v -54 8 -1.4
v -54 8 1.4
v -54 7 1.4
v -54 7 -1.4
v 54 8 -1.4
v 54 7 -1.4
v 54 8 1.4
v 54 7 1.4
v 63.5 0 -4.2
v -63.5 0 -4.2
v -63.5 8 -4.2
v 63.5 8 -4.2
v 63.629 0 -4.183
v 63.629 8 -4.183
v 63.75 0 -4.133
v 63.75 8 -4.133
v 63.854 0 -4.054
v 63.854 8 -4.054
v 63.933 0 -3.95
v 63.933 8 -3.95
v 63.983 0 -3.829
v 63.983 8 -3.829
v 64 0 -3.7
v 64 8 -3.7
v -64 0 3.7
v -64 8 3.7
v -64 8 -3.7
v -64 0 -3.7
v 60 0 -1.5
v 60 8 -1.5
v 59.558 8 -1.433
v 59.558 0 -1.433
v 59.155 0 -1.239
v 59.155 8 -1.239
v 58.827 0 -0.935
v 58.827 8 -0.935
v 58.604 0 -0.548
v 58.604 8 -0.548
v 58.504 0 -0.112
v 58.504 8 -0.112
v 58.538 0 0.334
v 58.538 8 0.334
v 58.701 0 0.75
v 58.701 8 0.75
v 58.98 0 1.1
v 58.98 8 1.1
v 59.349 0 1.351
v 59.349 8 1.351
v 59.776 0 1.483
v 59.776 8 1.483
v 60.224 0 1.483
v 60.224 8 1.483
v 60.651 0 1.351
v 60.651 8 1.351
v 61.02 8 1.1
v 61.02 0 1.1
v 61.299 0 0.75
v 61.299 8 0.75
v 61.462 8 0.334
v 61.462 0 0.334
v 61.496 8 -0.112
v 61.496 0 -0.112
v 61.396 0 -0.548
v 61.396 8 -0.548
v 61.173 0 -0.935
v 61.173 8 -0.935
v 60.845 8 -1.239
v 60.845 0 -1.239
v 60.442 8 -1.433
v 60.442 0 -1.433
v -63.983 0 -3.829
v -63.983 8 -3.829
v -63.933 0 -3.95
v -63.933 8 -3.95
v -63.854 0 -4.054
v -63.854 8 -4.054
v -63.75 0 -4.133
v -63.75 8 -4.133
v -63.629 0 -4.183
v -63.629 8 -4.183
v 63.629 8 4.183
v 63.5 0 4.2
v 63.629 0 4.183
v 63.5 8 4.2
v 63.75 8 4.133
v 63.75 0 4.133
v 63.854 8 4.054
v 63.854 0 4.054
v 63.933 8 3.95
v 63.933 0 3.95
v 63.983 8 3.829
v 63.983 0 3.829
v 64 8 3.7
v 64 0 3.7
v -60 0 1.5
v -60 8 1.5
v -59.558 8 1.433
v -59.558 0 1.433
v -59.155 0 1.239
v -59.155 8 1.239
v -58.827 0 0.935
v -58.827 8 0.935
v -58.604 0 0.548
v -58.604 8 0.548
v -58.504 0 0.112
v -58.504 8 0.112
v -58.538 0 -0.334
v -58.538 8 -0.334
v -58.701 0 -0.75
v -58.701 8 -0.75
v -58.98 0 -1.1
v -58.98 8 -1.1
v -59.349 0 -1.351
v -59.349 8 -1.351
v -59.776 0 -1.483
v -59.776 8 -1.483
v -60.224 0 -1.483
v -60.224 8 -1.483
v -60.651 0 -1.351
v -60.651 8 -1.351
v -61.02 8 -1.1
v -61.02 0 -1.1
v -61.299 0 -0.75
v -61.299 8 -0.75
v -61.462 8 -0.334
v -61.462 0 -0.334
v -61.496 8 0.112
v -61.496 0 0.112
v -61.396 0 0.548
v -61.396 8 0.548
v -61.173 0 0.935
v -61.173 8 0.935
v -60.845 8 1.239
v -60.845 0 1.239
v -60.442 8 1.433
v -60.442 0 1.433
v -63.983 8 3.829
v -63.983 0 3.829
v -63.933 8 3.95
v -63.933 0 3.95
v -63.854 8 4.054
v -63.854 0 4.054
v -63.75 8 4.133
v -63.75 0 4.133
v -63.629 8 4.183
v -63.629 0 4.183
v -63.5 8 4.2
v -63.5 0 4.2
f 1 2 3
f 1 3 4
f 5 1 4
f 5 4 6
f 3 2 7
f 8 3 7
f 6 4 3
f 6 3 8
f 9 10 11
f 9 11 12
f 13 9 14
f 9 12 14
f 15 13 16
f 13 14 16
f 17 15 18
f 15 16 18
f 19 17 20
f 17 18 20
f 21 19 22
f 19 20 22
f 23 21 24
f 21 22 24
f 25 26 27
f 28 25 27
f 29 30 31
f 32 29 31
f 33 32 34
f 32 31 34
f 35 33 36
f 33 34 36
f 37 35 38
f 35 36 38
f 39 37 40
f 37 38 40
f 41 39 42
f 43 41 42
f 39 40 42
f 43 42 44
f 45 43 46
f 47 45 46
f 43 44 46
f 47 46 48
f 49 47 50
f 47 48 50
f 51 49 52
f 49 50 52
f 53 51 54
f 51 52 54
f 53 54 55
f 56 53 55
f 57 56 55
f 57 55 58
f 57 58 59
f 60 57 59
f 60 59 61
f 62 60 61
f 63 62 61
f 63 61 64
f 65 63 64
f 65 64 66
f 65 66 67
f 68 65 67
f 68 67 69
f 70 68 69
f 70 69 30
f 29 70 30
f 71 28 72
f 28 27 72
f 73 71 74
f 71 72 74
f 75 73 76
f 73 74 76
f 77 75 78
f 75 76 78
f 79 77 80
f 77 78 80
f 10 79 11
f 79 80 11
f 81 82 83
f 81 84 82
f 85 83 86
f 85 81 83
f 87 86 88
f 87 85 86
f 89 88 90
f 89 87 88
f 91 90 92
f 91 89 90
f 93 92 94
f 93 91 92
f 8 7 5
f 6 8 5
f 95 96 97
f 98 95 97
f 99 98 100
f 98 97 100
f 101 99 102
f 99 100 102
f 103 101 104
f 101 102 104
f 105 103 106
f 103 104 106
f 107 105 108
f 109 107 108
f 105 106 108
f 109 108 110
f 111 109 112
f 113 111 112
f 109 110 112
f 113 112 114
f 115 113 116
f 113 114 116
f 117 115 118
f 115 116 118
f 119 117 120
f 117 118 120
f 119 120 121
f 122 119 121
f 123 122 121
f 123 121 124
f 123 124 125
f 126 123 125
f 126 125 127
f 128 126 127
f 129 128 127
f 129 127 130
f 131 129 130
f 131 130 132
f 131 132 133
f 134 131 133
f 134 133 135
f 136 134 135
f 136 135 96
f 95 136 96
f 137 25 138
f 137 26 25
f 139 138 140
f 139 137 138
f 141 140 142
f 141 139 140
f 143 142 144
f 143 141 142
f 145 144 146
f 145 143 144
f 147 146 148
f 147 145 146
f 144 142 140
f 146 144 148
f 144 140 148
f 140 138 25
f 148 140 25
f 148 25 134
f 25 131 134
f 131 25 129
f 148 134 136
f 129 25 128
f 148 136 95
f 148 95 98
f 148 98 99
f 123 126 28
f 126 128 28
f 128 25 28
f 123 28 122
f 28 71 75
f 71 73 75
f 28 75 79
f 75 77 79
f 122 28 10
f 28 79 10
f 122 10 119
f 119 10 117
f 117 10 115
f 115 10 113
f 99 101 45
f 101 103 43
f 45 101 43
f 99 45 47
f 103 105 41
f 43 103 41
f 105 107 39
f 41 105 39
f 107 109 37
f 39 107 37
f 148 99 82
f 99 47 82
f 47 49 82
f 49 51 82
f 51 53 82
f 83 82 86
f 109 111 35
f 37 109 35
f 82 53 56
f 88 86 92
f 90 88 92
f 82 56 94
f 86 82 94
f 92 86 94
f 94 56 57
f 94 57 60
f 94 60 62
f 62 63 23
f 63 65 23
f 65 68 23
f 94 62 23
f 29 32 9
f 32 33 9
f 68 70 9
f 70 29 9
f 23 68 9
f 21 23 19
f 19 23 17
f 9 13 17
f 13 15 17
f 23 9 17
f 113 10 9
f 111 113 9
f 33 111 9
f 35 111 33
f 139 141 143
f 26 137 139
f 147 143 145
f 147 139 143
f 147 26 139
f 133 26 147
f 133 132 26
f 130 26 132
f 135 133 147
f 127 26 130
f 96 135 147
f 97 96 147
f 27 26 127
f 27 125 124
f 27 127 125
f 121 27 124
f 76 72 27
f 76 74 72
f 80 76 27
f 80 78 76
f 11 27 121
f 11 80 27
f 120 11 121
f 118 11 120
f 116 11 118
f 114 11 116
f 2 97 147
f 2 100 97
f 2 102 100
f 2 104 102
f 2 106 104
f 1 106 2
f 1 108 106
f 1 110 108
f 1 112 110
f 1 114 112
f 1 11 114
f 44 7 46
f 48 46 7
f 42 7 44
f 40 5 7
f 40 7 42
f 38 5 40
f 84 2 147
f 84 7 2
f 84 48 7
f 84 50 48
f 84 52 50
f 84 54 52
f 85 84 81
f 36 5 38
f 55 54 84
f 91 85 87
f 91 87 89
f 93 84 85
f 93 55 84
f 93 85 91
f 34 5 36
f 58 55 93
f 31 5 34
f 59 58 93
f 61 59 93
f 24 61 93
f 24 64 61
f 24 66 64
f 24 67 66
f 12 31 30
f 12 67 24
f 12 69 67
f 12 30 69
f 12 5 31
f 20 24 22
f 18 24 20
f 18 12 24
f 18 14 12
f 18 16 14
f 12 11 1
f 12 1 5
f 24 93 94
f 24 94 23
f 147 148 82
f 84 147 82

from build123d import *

# Parameters (mm, degrees)
SKETCH1_W           = 128
SKETCH1_H           = 8.4
BOSS_EXTRUDE1_DEPTH = 8
SKETCH2_R           = 1.5
CUT_EXTRUDE1_DEPTH  = 65.634665621
SKETCH3_W           = 108
SKETCH3_H           = 2.8
CUT_EXTRUDE2_DEPTH  = 1
FILLET1_R           = 0.5


with BuildPart() as part:
    # Sketch1 → Boss-Extrude1 (new body)
    with BuildSketch(Plane(origin=(0, 0, 0), x_dir=(1, 0, 0), z_dir=(0, 1, 0))):
        Rectangle(SKETCH1_W, SKETCH1_H)
    extrude(amount=BOSS_EXTRUDE1_DEPTH)

    # Sketch2 → Cut-Extrude1 (cut, through all)
    with BuildSketch(Plane(origin=(0, 8, 0), x_dir=(1, 0, 0), z_dir=(0, 1, 0))):
        with Locations(Location((-60, 0, 0), (0, 0, 270))):
            Circle(SKETCH2_R)
        with Locations(Location((60, 0, 0), (0, 0, 90))):
            Circle(SKETCH2_R)
    extrude(amount=-CUT_EXTRUDE1_DEPTH, mode=Mode.SUBTRACT)

    # Sketch3 → Cut-Extrude2 (cut)
    with BuildSketch(Plane(origin=(0, 8, 0), x_dir=(1, 0, 0), z_dir=(0, 1, 0))):
        Rectangle(SKETCH3_W, SKETCH3_H)
    extrude(amount=-CUT_EXTRUDE2_DEPTH, mode=Mode.SUBTRACT)

    # Fillet1
    fillet1_edges = [part.edges().sort_by_distance(p)[0] for p in [
        (64, 4, 4.2),
        (-64, 4, 4.2),
        (-64, 4, -4.2),
        (64, 4, -4.2),
    ]]
    fillet(fillet1_edges, radius=FILLET1_R)


solid = part.part
